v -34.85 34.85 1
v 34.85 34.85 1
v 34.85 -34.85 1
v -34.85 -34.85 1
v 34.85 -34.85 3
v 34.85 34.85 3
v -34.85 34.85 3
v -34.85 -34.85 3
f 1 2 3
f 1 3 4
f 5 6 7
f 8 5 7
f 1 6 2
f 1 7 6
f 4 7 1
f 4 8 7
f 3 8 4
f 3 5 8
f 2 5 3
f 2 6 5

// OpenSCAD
// ==== Shared Parameters ====
// Measure your pedestal's internal rebate (seat) carefully.
cavity_w   = 70;    // inner width (mm)
cavity_d   = 70;    // inner depth (mm)
lip_depth  = 2;     // rebate depth available for the diffuser to sit in (mm)
thickness  = 2.0;   // diffuser thickness (mm)
clearance  = 0.3;   // positive clearance for sit-on fit (mm)
chamfer    = 0.6;   // small edge break

/*
  Square diffuser — sit-on (rests in the pedestal rebate)
*/

module chamfered_plate(w,d,t, c){
  linear_extrude(height=t)
    offset(delta=-c)
      offset(delta=+c)
        square([w,d], center=true);
}

translate([0,0,thickness/2])
  chamfered_plate(cavity_w - clearance, cavity_d - clearance, thickness, chamfer);
